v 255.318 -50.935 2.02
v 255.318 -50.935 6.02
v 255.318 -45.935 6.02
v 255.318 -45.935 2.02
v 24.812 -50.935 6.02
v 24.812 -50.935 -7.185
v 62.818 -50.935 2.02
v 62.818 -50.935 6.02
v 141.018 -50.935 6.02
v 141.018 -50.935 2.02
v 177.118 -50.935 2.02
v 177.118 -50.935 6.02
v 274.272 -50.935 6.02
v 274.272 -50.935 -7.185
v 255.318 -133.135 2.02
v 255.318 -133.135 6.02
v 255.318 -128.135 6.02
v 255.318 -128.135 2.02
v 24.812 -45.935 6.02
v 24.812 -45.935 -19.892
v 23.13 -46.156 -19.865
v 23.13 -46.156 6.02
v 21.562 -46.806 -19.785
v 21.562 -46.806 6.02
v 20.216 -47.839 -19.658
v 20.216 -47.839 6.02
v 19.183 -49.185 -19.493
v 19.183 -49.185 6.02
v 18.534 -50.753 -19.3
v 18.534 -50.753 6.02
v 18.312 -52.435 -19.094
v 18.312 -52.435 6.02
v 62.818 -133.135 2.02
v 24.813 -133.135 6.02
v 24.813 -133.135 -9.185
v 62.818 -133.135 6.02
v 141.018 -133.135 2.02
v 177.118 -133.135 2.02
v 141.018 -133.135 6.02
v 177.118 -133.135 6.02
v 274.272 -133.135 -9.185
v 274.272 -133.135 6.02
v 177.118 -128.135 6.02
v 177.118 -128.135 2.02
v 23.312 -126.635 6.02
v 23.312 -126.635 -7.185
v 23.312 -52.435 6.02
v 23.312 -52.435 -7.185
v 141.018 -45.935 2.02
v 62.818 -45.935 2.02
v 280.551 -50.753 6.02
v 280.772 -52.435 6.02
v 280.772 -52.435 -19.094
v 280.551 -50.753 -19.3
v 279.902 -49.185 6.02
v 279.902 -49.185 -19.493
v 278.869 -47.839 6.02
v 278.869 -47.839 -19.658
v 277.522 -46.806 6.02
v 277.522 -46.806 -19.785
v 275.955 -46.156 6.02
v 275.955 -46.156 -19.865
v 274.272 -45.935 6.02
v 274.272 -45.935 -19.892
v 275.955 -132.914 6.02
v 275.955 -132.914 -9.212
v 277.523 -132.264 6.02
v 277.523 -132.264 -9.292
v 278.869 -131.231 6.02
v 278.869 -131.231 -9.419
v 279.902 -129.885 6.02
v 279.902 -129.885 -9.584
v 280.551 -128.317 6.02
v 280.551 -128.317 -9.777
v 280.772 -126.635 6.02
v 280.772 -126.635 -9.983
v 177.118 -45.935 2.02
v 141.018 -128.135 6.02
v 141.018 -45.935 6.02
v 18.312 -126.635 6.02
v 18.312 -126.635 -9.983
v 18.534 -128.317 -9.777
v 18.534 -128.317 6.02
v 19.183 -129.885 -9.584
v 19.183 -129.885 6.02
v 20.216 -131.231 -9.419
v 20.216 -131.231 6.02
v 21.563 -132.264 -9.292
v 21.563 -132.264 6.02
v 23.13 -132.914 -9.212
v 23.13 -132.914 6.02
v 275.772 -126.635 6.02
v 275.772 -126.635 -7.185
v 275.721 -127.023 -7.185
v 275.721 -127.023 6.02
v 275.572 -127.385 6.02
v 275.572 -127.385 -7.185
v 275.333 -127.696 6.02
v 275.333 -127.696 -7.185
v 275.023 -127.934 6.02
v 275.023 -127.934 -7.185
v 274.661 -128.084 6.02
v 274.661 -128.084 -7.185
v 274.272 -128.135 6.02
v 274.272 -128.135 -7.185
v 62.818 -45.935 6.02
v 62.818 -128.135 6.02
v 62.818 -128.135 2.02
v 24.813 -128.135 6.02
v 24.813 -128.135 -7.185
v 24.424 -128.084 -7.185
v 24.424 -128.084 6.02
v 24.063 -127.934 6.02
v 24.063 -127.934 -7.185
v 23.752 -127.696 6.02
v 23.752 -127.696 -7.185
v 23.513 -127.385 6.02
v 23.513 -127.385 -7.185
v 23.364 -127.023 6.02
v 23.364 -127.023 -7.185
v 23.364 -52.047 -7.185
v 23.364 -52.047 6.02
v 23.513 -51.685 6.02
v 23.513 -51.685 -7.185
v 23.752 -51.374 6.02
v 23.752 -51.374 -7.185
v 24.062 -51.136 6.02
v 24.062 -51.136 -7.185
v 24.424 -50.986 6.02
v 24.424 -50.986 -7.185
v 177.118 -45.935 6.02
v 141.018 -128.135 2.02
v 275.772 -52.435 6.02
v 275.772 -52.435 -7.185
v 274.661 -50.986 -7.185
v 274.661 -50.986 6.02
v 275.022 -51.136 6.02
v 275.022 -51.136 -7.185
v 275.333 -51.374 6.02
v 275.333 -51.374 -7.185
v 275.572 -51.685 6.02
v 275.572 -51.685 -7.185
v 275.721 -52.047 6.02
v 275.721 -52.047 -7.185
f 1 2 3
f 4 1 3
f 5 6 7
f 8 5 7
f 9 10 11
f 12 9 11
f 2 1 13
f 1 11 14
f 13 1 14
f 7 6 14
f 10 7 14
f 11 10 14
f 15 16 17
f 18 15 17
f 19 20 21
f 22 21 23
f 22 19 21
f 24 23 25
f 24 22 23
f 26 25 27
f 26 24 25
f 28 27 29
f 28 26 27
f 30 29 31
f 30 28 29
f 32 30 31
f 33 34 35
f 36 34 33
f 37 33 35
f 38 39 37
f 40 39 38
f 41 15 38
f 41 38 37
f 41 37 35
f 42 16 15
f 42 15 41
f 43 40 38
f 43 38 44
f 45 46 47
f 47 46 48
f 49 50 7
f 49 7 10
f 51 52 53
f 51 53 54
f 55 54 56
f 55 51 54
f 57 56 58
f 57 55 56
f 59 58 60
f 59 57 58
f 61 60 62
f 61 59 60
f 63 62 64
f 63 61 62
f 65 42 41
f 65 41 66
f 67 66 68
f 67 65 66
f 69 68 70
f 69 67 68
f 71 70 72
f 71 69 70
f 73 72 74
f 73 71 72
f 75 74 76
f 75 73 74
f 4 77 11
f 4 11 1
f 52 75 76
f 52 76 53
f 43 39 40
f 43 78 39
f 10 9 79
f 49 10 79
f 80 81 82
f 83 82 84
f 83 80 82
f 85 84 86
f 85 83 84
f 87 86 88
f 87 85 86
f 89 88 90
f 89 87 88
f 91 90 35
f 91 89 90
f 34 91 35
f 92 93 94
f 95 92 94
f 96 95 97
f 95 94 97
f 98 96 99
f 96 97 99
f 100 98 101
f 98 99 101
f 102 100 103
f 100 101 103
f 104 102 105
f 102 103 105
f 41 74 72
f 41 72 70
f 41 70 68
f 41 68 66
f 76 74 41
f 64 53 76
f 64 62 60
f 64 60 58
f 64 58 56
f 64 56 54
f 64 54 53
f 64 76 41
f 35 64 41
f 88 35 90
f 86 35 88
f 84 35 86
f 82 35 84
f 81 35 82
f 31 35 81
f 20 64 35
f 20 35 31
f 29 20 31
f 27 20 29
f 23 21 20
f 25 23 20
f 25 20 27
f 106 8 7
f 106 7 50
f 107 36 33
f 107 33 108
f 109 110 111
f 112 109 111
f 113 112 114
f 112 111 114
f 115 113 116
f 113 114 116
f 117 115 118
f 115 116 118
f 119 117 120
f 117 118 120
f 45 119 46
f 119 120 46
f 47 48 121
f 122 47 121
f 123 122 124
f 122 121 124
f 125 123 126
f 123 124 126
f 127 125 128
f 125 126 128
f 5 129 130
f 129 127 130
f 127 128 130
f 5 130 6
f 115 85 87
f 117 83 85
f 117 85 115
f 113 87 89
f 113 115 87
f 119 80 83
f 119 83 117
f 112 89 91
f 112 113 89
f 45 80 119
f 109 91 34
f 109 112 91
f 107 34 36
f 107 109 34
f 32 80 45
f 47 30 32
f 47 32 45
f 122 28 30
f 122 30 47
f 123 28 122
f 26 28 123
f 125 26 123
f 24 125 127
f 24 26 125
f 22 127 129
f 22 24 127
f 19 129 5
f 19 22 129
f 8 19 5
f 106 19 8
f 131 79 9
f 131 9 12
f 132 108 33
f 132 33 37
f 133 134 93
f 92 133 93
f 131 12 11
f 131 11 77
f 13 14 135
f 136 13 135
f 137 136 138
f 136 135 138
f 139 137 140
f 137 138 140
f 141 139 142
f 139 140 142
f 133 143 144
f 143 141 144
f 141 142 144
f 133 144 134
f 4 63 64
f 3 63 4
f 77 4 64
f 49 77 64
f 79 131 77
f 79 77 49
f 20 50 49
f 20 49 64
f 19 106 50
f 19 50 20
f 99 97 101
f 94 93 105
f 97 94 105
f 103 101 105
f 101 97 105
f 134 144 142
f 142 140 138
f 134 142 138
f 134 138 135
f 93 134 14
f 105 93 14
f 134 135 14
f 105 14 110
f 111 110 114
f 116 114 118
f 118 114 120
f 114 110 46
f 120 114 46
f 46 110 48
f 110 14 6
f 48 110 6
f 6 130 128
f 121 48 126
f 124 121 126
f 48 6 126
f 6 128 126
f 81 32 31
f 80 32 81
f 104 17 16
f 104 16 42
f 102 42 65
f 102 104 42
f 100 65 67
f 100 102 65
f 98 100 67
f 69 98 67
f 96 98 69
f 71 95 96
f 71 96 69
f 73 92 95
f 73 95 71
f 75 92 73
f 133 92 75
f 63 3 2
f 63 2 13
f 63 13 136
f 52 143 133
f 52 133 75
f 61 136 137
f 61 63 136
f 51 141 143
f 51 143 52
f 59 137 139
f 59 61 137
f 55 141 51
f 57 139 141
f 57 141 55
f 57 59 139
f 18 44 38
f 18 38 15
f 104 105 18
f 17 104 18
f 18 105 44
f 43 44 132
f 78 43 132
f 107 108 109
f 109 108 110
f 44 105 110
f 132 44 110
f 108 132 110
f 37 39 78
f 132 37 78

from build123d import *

# Parameters (mm, degrees)
MAIN_CASE_OUTLINE_DEPTH      = 6.02
MAIN_CASE_OUTLINE_DEPTH_BACK = 6.185
SKETCH2_W                    = 78.2
SKETCH2_H                    = 5
GASKET_CUTOUTS_DEPTH         = 4
MAKE_START                   = -9.185
MAKE_ROOM_FOR_BATTERY_DEPTH  = 3
SOLIDIFY_BOTTOM_DEPTH        = 2
MOVE_FACE2_BY                = 15


# Read off the part's stored shape, not the designer's step: Make Room for Battery
with BuildPart() as part:
    # Sketch1 → Main Case Outline (new, two sides: drawn at the far end of the back side and taken through both)
    with BuildSketch(Plane.XY.offset(-MAIN_CASE_OUTLINE_DEPTH_BACK)):
        with BuildLine():
            Line((274.272499626, -45.935), (24.8125, -45.935))
            ThreePointArc((24.8125, -45.935), (20.216304251, -47.838807156), (18.3125, -52.435004109))
            Line((18.3125, -52.435004109), (18.3125, -126.635))
            ThreePointArc((18.3125, -126.635), (20.216307156, -131.231195749), (24.812504109, -133.135))
            Line((24.812504109, -133.135), (274.2725, -133.135))
            ThreePointArc((274.2725, -133.135), (278.868695177, -131.231193416), (280.7725, -126.63499751))
            Line((280.7725, -126.63499751), (280.7725, -52.435))
            ThreePointArc((280.7725, -52.435), (278.868694164, -47.838805571), (274.272499626, -45.935))
        make_face()
        with BuildLine():
            Line((275.7725, -126.635), (275.7725, -52.435))
            ThreePointArc((275.7725, -52.435), (275.333160259, -51.374339477), (274.272499626, -50.935))
            Line((274.272499626, -50.935), (24.8125, -50.935))
            ThreePointArc((24.8125, -50.935), (23.751839477, -51.374339741), (23.3125, -52.435000374))
            Line((23.3125, -52.435000374), (23.3125, -126.635))
            ThreePointArc((23.3125, -126.635), (23.751839741, -127.695660523), (24.812500374, -128.135))
            Line((24.812500374, -128.135), (274.2725, -128.135))
            ThreePointArc((274.2725, -128.135), (275.333160391, -127.695660391), (275.7725, -126.635))
        make_face(mode=Mode.SUBTRACT)
    extrude(amount=MAIN_CASE_OUTLINE_DEPTH + MAIN_CASE_OUTLINE_DEPTH_BACK)

    # Sketch2 → Gasket Cutouts (cut)
    with BuildSketch(Plane.XY.offset(6.02)):
        with Locations((101.9175, -130.635)):
            Rectangle(SKETCH2_W, SKETCH2_H)
        with Locations((216.2175, -130.635)):
            Rectangle(SKETCH2_W, SKETCH2_H)
        with Locations((101.9175, -48.435)):
            Rectangle(SKETCH2_W, SKETCH2_H)
        with Locations((216.2175, -48.435)):
            Rectangle(SKETCH2_W, SKETCH2_H)
    extrude(amount=-GASKET_CUTOUTS_DEPTH, mode=Mode.SUBTRACT)

    # Make Room for Battery outline → Make Room for Battery (add)
    with BuildSketch(Plane.XY.offset(MAKE_START)):
        with BuildLine():
            Line((280.7725, -126.63499751), (280.7725, -52.435))
            ThreePointArc((280.7725, -52.435), (278.868694164, -47.838805571), (274.272499626, -45.935))
            Line((274.272499626, -45.935), (24.8125, -45.935))
            ThreePointArc((24.8125, -45.935), (20.216304251, -47.838807156), (18.3125, -52.435004109))
            Line((18.3125, -52.435004109), (18.3125, -126.635))
            ThreePointArc((18.3125, -126.635), (20.216307156, -131.231195749), (24.812504109, -133.135))
            Line((24.812504109, -133.135), (274.2725, -133.135))
            ThreePointArc((274.2725, -133.135), (278.868695177, -131.231193416), (280.7725, -126.63499751))
        make_face()
        with BuildLine():
            ThreePointArc((275.7725, -126.635), (275.333160391, -127.695660391), (274.2725, -128.135))
            Line((274.2725, -128.135), (24.812500374, -128.135))
            ThreePointArc((24.812500374, -128.135), (23.751839741, -127.695660523), (23.3125, -126.635))
            Line((23.3125, -126.635), (23.3125, -52.435000374))
            ThreePointArc((23.3125, -52.435000374), (23.751839477, -51.374339741), (24.8125, -50.935))
            Line((24.8125, -50.935), (274.272499626, -50.935))
            ThreePointArc((274.272499626, -50.935), (275.333160259, -51.374339477), (275.7725, -52.435))
            Line((275.7725, -52.435), (275.7725, -126.635))
        make_face(mode=Mode.SUBTRACT)
    extrude(amount=MAKE_ROOM_FOR_BATTERY_DEPTH)

    # Sketch3 → Solidify Bottom (add)
    with BuildSketch(Plane(origin=(0, 0, -9.185), x_dir=(-1, 0, 0), z_dir=(0, 0, -1))):
        with BuildLine():
            Line((-280.7725, -52.435), (-280.7725, -126.63499751))
            ThreePointArc((-280.7725, -126.63499751), (-278.868695177, -131.231193416), (-274.2725, -133.135))
            Line((-274.2725, -133.135), (-24.812504109, -133.135))
            ThreePointArc((-24.812504109, -133.135), (-20.216307156, -131.231195749), (-18.3125, -126.635))
            Line((-18.3125, -126.635), (-18.3125, -52.435004109))
            ThreePointArc((-18.3125, -52.435004109), (-20.216304251, -47.838807156), (-24.8125, -45.935))
            Line((-24.8125, -45.935), (-274.272499626, -45.935))
            ThreePointArc((-274.272499626, -45.935), (-278.868694164, -47.838805571), (-280.7725, -52.435))
        make_face()
    extrude(amount=-SOLIDIFY_BOTTOM_DEPTH)

    # Move Face2: a face moved outward by 15.0
    extrude(part.faces().sort_by_distance((149.5425, -89.535, -9.185))[0], amount=MOVE_FACE2_BY, dir=(0, 0, -1))

    # Cut Bottom Face to Angle
    split(bisect_by=Plane(origin=(0, -3.088365547, -25.152718908), x_dir=(-1, 0, 0), z_dir=(2.5491867248569473e-15, -0.12186934340514763, -0.992546151641322)), keep=Keep.BOTTOM)


solid = part.part
